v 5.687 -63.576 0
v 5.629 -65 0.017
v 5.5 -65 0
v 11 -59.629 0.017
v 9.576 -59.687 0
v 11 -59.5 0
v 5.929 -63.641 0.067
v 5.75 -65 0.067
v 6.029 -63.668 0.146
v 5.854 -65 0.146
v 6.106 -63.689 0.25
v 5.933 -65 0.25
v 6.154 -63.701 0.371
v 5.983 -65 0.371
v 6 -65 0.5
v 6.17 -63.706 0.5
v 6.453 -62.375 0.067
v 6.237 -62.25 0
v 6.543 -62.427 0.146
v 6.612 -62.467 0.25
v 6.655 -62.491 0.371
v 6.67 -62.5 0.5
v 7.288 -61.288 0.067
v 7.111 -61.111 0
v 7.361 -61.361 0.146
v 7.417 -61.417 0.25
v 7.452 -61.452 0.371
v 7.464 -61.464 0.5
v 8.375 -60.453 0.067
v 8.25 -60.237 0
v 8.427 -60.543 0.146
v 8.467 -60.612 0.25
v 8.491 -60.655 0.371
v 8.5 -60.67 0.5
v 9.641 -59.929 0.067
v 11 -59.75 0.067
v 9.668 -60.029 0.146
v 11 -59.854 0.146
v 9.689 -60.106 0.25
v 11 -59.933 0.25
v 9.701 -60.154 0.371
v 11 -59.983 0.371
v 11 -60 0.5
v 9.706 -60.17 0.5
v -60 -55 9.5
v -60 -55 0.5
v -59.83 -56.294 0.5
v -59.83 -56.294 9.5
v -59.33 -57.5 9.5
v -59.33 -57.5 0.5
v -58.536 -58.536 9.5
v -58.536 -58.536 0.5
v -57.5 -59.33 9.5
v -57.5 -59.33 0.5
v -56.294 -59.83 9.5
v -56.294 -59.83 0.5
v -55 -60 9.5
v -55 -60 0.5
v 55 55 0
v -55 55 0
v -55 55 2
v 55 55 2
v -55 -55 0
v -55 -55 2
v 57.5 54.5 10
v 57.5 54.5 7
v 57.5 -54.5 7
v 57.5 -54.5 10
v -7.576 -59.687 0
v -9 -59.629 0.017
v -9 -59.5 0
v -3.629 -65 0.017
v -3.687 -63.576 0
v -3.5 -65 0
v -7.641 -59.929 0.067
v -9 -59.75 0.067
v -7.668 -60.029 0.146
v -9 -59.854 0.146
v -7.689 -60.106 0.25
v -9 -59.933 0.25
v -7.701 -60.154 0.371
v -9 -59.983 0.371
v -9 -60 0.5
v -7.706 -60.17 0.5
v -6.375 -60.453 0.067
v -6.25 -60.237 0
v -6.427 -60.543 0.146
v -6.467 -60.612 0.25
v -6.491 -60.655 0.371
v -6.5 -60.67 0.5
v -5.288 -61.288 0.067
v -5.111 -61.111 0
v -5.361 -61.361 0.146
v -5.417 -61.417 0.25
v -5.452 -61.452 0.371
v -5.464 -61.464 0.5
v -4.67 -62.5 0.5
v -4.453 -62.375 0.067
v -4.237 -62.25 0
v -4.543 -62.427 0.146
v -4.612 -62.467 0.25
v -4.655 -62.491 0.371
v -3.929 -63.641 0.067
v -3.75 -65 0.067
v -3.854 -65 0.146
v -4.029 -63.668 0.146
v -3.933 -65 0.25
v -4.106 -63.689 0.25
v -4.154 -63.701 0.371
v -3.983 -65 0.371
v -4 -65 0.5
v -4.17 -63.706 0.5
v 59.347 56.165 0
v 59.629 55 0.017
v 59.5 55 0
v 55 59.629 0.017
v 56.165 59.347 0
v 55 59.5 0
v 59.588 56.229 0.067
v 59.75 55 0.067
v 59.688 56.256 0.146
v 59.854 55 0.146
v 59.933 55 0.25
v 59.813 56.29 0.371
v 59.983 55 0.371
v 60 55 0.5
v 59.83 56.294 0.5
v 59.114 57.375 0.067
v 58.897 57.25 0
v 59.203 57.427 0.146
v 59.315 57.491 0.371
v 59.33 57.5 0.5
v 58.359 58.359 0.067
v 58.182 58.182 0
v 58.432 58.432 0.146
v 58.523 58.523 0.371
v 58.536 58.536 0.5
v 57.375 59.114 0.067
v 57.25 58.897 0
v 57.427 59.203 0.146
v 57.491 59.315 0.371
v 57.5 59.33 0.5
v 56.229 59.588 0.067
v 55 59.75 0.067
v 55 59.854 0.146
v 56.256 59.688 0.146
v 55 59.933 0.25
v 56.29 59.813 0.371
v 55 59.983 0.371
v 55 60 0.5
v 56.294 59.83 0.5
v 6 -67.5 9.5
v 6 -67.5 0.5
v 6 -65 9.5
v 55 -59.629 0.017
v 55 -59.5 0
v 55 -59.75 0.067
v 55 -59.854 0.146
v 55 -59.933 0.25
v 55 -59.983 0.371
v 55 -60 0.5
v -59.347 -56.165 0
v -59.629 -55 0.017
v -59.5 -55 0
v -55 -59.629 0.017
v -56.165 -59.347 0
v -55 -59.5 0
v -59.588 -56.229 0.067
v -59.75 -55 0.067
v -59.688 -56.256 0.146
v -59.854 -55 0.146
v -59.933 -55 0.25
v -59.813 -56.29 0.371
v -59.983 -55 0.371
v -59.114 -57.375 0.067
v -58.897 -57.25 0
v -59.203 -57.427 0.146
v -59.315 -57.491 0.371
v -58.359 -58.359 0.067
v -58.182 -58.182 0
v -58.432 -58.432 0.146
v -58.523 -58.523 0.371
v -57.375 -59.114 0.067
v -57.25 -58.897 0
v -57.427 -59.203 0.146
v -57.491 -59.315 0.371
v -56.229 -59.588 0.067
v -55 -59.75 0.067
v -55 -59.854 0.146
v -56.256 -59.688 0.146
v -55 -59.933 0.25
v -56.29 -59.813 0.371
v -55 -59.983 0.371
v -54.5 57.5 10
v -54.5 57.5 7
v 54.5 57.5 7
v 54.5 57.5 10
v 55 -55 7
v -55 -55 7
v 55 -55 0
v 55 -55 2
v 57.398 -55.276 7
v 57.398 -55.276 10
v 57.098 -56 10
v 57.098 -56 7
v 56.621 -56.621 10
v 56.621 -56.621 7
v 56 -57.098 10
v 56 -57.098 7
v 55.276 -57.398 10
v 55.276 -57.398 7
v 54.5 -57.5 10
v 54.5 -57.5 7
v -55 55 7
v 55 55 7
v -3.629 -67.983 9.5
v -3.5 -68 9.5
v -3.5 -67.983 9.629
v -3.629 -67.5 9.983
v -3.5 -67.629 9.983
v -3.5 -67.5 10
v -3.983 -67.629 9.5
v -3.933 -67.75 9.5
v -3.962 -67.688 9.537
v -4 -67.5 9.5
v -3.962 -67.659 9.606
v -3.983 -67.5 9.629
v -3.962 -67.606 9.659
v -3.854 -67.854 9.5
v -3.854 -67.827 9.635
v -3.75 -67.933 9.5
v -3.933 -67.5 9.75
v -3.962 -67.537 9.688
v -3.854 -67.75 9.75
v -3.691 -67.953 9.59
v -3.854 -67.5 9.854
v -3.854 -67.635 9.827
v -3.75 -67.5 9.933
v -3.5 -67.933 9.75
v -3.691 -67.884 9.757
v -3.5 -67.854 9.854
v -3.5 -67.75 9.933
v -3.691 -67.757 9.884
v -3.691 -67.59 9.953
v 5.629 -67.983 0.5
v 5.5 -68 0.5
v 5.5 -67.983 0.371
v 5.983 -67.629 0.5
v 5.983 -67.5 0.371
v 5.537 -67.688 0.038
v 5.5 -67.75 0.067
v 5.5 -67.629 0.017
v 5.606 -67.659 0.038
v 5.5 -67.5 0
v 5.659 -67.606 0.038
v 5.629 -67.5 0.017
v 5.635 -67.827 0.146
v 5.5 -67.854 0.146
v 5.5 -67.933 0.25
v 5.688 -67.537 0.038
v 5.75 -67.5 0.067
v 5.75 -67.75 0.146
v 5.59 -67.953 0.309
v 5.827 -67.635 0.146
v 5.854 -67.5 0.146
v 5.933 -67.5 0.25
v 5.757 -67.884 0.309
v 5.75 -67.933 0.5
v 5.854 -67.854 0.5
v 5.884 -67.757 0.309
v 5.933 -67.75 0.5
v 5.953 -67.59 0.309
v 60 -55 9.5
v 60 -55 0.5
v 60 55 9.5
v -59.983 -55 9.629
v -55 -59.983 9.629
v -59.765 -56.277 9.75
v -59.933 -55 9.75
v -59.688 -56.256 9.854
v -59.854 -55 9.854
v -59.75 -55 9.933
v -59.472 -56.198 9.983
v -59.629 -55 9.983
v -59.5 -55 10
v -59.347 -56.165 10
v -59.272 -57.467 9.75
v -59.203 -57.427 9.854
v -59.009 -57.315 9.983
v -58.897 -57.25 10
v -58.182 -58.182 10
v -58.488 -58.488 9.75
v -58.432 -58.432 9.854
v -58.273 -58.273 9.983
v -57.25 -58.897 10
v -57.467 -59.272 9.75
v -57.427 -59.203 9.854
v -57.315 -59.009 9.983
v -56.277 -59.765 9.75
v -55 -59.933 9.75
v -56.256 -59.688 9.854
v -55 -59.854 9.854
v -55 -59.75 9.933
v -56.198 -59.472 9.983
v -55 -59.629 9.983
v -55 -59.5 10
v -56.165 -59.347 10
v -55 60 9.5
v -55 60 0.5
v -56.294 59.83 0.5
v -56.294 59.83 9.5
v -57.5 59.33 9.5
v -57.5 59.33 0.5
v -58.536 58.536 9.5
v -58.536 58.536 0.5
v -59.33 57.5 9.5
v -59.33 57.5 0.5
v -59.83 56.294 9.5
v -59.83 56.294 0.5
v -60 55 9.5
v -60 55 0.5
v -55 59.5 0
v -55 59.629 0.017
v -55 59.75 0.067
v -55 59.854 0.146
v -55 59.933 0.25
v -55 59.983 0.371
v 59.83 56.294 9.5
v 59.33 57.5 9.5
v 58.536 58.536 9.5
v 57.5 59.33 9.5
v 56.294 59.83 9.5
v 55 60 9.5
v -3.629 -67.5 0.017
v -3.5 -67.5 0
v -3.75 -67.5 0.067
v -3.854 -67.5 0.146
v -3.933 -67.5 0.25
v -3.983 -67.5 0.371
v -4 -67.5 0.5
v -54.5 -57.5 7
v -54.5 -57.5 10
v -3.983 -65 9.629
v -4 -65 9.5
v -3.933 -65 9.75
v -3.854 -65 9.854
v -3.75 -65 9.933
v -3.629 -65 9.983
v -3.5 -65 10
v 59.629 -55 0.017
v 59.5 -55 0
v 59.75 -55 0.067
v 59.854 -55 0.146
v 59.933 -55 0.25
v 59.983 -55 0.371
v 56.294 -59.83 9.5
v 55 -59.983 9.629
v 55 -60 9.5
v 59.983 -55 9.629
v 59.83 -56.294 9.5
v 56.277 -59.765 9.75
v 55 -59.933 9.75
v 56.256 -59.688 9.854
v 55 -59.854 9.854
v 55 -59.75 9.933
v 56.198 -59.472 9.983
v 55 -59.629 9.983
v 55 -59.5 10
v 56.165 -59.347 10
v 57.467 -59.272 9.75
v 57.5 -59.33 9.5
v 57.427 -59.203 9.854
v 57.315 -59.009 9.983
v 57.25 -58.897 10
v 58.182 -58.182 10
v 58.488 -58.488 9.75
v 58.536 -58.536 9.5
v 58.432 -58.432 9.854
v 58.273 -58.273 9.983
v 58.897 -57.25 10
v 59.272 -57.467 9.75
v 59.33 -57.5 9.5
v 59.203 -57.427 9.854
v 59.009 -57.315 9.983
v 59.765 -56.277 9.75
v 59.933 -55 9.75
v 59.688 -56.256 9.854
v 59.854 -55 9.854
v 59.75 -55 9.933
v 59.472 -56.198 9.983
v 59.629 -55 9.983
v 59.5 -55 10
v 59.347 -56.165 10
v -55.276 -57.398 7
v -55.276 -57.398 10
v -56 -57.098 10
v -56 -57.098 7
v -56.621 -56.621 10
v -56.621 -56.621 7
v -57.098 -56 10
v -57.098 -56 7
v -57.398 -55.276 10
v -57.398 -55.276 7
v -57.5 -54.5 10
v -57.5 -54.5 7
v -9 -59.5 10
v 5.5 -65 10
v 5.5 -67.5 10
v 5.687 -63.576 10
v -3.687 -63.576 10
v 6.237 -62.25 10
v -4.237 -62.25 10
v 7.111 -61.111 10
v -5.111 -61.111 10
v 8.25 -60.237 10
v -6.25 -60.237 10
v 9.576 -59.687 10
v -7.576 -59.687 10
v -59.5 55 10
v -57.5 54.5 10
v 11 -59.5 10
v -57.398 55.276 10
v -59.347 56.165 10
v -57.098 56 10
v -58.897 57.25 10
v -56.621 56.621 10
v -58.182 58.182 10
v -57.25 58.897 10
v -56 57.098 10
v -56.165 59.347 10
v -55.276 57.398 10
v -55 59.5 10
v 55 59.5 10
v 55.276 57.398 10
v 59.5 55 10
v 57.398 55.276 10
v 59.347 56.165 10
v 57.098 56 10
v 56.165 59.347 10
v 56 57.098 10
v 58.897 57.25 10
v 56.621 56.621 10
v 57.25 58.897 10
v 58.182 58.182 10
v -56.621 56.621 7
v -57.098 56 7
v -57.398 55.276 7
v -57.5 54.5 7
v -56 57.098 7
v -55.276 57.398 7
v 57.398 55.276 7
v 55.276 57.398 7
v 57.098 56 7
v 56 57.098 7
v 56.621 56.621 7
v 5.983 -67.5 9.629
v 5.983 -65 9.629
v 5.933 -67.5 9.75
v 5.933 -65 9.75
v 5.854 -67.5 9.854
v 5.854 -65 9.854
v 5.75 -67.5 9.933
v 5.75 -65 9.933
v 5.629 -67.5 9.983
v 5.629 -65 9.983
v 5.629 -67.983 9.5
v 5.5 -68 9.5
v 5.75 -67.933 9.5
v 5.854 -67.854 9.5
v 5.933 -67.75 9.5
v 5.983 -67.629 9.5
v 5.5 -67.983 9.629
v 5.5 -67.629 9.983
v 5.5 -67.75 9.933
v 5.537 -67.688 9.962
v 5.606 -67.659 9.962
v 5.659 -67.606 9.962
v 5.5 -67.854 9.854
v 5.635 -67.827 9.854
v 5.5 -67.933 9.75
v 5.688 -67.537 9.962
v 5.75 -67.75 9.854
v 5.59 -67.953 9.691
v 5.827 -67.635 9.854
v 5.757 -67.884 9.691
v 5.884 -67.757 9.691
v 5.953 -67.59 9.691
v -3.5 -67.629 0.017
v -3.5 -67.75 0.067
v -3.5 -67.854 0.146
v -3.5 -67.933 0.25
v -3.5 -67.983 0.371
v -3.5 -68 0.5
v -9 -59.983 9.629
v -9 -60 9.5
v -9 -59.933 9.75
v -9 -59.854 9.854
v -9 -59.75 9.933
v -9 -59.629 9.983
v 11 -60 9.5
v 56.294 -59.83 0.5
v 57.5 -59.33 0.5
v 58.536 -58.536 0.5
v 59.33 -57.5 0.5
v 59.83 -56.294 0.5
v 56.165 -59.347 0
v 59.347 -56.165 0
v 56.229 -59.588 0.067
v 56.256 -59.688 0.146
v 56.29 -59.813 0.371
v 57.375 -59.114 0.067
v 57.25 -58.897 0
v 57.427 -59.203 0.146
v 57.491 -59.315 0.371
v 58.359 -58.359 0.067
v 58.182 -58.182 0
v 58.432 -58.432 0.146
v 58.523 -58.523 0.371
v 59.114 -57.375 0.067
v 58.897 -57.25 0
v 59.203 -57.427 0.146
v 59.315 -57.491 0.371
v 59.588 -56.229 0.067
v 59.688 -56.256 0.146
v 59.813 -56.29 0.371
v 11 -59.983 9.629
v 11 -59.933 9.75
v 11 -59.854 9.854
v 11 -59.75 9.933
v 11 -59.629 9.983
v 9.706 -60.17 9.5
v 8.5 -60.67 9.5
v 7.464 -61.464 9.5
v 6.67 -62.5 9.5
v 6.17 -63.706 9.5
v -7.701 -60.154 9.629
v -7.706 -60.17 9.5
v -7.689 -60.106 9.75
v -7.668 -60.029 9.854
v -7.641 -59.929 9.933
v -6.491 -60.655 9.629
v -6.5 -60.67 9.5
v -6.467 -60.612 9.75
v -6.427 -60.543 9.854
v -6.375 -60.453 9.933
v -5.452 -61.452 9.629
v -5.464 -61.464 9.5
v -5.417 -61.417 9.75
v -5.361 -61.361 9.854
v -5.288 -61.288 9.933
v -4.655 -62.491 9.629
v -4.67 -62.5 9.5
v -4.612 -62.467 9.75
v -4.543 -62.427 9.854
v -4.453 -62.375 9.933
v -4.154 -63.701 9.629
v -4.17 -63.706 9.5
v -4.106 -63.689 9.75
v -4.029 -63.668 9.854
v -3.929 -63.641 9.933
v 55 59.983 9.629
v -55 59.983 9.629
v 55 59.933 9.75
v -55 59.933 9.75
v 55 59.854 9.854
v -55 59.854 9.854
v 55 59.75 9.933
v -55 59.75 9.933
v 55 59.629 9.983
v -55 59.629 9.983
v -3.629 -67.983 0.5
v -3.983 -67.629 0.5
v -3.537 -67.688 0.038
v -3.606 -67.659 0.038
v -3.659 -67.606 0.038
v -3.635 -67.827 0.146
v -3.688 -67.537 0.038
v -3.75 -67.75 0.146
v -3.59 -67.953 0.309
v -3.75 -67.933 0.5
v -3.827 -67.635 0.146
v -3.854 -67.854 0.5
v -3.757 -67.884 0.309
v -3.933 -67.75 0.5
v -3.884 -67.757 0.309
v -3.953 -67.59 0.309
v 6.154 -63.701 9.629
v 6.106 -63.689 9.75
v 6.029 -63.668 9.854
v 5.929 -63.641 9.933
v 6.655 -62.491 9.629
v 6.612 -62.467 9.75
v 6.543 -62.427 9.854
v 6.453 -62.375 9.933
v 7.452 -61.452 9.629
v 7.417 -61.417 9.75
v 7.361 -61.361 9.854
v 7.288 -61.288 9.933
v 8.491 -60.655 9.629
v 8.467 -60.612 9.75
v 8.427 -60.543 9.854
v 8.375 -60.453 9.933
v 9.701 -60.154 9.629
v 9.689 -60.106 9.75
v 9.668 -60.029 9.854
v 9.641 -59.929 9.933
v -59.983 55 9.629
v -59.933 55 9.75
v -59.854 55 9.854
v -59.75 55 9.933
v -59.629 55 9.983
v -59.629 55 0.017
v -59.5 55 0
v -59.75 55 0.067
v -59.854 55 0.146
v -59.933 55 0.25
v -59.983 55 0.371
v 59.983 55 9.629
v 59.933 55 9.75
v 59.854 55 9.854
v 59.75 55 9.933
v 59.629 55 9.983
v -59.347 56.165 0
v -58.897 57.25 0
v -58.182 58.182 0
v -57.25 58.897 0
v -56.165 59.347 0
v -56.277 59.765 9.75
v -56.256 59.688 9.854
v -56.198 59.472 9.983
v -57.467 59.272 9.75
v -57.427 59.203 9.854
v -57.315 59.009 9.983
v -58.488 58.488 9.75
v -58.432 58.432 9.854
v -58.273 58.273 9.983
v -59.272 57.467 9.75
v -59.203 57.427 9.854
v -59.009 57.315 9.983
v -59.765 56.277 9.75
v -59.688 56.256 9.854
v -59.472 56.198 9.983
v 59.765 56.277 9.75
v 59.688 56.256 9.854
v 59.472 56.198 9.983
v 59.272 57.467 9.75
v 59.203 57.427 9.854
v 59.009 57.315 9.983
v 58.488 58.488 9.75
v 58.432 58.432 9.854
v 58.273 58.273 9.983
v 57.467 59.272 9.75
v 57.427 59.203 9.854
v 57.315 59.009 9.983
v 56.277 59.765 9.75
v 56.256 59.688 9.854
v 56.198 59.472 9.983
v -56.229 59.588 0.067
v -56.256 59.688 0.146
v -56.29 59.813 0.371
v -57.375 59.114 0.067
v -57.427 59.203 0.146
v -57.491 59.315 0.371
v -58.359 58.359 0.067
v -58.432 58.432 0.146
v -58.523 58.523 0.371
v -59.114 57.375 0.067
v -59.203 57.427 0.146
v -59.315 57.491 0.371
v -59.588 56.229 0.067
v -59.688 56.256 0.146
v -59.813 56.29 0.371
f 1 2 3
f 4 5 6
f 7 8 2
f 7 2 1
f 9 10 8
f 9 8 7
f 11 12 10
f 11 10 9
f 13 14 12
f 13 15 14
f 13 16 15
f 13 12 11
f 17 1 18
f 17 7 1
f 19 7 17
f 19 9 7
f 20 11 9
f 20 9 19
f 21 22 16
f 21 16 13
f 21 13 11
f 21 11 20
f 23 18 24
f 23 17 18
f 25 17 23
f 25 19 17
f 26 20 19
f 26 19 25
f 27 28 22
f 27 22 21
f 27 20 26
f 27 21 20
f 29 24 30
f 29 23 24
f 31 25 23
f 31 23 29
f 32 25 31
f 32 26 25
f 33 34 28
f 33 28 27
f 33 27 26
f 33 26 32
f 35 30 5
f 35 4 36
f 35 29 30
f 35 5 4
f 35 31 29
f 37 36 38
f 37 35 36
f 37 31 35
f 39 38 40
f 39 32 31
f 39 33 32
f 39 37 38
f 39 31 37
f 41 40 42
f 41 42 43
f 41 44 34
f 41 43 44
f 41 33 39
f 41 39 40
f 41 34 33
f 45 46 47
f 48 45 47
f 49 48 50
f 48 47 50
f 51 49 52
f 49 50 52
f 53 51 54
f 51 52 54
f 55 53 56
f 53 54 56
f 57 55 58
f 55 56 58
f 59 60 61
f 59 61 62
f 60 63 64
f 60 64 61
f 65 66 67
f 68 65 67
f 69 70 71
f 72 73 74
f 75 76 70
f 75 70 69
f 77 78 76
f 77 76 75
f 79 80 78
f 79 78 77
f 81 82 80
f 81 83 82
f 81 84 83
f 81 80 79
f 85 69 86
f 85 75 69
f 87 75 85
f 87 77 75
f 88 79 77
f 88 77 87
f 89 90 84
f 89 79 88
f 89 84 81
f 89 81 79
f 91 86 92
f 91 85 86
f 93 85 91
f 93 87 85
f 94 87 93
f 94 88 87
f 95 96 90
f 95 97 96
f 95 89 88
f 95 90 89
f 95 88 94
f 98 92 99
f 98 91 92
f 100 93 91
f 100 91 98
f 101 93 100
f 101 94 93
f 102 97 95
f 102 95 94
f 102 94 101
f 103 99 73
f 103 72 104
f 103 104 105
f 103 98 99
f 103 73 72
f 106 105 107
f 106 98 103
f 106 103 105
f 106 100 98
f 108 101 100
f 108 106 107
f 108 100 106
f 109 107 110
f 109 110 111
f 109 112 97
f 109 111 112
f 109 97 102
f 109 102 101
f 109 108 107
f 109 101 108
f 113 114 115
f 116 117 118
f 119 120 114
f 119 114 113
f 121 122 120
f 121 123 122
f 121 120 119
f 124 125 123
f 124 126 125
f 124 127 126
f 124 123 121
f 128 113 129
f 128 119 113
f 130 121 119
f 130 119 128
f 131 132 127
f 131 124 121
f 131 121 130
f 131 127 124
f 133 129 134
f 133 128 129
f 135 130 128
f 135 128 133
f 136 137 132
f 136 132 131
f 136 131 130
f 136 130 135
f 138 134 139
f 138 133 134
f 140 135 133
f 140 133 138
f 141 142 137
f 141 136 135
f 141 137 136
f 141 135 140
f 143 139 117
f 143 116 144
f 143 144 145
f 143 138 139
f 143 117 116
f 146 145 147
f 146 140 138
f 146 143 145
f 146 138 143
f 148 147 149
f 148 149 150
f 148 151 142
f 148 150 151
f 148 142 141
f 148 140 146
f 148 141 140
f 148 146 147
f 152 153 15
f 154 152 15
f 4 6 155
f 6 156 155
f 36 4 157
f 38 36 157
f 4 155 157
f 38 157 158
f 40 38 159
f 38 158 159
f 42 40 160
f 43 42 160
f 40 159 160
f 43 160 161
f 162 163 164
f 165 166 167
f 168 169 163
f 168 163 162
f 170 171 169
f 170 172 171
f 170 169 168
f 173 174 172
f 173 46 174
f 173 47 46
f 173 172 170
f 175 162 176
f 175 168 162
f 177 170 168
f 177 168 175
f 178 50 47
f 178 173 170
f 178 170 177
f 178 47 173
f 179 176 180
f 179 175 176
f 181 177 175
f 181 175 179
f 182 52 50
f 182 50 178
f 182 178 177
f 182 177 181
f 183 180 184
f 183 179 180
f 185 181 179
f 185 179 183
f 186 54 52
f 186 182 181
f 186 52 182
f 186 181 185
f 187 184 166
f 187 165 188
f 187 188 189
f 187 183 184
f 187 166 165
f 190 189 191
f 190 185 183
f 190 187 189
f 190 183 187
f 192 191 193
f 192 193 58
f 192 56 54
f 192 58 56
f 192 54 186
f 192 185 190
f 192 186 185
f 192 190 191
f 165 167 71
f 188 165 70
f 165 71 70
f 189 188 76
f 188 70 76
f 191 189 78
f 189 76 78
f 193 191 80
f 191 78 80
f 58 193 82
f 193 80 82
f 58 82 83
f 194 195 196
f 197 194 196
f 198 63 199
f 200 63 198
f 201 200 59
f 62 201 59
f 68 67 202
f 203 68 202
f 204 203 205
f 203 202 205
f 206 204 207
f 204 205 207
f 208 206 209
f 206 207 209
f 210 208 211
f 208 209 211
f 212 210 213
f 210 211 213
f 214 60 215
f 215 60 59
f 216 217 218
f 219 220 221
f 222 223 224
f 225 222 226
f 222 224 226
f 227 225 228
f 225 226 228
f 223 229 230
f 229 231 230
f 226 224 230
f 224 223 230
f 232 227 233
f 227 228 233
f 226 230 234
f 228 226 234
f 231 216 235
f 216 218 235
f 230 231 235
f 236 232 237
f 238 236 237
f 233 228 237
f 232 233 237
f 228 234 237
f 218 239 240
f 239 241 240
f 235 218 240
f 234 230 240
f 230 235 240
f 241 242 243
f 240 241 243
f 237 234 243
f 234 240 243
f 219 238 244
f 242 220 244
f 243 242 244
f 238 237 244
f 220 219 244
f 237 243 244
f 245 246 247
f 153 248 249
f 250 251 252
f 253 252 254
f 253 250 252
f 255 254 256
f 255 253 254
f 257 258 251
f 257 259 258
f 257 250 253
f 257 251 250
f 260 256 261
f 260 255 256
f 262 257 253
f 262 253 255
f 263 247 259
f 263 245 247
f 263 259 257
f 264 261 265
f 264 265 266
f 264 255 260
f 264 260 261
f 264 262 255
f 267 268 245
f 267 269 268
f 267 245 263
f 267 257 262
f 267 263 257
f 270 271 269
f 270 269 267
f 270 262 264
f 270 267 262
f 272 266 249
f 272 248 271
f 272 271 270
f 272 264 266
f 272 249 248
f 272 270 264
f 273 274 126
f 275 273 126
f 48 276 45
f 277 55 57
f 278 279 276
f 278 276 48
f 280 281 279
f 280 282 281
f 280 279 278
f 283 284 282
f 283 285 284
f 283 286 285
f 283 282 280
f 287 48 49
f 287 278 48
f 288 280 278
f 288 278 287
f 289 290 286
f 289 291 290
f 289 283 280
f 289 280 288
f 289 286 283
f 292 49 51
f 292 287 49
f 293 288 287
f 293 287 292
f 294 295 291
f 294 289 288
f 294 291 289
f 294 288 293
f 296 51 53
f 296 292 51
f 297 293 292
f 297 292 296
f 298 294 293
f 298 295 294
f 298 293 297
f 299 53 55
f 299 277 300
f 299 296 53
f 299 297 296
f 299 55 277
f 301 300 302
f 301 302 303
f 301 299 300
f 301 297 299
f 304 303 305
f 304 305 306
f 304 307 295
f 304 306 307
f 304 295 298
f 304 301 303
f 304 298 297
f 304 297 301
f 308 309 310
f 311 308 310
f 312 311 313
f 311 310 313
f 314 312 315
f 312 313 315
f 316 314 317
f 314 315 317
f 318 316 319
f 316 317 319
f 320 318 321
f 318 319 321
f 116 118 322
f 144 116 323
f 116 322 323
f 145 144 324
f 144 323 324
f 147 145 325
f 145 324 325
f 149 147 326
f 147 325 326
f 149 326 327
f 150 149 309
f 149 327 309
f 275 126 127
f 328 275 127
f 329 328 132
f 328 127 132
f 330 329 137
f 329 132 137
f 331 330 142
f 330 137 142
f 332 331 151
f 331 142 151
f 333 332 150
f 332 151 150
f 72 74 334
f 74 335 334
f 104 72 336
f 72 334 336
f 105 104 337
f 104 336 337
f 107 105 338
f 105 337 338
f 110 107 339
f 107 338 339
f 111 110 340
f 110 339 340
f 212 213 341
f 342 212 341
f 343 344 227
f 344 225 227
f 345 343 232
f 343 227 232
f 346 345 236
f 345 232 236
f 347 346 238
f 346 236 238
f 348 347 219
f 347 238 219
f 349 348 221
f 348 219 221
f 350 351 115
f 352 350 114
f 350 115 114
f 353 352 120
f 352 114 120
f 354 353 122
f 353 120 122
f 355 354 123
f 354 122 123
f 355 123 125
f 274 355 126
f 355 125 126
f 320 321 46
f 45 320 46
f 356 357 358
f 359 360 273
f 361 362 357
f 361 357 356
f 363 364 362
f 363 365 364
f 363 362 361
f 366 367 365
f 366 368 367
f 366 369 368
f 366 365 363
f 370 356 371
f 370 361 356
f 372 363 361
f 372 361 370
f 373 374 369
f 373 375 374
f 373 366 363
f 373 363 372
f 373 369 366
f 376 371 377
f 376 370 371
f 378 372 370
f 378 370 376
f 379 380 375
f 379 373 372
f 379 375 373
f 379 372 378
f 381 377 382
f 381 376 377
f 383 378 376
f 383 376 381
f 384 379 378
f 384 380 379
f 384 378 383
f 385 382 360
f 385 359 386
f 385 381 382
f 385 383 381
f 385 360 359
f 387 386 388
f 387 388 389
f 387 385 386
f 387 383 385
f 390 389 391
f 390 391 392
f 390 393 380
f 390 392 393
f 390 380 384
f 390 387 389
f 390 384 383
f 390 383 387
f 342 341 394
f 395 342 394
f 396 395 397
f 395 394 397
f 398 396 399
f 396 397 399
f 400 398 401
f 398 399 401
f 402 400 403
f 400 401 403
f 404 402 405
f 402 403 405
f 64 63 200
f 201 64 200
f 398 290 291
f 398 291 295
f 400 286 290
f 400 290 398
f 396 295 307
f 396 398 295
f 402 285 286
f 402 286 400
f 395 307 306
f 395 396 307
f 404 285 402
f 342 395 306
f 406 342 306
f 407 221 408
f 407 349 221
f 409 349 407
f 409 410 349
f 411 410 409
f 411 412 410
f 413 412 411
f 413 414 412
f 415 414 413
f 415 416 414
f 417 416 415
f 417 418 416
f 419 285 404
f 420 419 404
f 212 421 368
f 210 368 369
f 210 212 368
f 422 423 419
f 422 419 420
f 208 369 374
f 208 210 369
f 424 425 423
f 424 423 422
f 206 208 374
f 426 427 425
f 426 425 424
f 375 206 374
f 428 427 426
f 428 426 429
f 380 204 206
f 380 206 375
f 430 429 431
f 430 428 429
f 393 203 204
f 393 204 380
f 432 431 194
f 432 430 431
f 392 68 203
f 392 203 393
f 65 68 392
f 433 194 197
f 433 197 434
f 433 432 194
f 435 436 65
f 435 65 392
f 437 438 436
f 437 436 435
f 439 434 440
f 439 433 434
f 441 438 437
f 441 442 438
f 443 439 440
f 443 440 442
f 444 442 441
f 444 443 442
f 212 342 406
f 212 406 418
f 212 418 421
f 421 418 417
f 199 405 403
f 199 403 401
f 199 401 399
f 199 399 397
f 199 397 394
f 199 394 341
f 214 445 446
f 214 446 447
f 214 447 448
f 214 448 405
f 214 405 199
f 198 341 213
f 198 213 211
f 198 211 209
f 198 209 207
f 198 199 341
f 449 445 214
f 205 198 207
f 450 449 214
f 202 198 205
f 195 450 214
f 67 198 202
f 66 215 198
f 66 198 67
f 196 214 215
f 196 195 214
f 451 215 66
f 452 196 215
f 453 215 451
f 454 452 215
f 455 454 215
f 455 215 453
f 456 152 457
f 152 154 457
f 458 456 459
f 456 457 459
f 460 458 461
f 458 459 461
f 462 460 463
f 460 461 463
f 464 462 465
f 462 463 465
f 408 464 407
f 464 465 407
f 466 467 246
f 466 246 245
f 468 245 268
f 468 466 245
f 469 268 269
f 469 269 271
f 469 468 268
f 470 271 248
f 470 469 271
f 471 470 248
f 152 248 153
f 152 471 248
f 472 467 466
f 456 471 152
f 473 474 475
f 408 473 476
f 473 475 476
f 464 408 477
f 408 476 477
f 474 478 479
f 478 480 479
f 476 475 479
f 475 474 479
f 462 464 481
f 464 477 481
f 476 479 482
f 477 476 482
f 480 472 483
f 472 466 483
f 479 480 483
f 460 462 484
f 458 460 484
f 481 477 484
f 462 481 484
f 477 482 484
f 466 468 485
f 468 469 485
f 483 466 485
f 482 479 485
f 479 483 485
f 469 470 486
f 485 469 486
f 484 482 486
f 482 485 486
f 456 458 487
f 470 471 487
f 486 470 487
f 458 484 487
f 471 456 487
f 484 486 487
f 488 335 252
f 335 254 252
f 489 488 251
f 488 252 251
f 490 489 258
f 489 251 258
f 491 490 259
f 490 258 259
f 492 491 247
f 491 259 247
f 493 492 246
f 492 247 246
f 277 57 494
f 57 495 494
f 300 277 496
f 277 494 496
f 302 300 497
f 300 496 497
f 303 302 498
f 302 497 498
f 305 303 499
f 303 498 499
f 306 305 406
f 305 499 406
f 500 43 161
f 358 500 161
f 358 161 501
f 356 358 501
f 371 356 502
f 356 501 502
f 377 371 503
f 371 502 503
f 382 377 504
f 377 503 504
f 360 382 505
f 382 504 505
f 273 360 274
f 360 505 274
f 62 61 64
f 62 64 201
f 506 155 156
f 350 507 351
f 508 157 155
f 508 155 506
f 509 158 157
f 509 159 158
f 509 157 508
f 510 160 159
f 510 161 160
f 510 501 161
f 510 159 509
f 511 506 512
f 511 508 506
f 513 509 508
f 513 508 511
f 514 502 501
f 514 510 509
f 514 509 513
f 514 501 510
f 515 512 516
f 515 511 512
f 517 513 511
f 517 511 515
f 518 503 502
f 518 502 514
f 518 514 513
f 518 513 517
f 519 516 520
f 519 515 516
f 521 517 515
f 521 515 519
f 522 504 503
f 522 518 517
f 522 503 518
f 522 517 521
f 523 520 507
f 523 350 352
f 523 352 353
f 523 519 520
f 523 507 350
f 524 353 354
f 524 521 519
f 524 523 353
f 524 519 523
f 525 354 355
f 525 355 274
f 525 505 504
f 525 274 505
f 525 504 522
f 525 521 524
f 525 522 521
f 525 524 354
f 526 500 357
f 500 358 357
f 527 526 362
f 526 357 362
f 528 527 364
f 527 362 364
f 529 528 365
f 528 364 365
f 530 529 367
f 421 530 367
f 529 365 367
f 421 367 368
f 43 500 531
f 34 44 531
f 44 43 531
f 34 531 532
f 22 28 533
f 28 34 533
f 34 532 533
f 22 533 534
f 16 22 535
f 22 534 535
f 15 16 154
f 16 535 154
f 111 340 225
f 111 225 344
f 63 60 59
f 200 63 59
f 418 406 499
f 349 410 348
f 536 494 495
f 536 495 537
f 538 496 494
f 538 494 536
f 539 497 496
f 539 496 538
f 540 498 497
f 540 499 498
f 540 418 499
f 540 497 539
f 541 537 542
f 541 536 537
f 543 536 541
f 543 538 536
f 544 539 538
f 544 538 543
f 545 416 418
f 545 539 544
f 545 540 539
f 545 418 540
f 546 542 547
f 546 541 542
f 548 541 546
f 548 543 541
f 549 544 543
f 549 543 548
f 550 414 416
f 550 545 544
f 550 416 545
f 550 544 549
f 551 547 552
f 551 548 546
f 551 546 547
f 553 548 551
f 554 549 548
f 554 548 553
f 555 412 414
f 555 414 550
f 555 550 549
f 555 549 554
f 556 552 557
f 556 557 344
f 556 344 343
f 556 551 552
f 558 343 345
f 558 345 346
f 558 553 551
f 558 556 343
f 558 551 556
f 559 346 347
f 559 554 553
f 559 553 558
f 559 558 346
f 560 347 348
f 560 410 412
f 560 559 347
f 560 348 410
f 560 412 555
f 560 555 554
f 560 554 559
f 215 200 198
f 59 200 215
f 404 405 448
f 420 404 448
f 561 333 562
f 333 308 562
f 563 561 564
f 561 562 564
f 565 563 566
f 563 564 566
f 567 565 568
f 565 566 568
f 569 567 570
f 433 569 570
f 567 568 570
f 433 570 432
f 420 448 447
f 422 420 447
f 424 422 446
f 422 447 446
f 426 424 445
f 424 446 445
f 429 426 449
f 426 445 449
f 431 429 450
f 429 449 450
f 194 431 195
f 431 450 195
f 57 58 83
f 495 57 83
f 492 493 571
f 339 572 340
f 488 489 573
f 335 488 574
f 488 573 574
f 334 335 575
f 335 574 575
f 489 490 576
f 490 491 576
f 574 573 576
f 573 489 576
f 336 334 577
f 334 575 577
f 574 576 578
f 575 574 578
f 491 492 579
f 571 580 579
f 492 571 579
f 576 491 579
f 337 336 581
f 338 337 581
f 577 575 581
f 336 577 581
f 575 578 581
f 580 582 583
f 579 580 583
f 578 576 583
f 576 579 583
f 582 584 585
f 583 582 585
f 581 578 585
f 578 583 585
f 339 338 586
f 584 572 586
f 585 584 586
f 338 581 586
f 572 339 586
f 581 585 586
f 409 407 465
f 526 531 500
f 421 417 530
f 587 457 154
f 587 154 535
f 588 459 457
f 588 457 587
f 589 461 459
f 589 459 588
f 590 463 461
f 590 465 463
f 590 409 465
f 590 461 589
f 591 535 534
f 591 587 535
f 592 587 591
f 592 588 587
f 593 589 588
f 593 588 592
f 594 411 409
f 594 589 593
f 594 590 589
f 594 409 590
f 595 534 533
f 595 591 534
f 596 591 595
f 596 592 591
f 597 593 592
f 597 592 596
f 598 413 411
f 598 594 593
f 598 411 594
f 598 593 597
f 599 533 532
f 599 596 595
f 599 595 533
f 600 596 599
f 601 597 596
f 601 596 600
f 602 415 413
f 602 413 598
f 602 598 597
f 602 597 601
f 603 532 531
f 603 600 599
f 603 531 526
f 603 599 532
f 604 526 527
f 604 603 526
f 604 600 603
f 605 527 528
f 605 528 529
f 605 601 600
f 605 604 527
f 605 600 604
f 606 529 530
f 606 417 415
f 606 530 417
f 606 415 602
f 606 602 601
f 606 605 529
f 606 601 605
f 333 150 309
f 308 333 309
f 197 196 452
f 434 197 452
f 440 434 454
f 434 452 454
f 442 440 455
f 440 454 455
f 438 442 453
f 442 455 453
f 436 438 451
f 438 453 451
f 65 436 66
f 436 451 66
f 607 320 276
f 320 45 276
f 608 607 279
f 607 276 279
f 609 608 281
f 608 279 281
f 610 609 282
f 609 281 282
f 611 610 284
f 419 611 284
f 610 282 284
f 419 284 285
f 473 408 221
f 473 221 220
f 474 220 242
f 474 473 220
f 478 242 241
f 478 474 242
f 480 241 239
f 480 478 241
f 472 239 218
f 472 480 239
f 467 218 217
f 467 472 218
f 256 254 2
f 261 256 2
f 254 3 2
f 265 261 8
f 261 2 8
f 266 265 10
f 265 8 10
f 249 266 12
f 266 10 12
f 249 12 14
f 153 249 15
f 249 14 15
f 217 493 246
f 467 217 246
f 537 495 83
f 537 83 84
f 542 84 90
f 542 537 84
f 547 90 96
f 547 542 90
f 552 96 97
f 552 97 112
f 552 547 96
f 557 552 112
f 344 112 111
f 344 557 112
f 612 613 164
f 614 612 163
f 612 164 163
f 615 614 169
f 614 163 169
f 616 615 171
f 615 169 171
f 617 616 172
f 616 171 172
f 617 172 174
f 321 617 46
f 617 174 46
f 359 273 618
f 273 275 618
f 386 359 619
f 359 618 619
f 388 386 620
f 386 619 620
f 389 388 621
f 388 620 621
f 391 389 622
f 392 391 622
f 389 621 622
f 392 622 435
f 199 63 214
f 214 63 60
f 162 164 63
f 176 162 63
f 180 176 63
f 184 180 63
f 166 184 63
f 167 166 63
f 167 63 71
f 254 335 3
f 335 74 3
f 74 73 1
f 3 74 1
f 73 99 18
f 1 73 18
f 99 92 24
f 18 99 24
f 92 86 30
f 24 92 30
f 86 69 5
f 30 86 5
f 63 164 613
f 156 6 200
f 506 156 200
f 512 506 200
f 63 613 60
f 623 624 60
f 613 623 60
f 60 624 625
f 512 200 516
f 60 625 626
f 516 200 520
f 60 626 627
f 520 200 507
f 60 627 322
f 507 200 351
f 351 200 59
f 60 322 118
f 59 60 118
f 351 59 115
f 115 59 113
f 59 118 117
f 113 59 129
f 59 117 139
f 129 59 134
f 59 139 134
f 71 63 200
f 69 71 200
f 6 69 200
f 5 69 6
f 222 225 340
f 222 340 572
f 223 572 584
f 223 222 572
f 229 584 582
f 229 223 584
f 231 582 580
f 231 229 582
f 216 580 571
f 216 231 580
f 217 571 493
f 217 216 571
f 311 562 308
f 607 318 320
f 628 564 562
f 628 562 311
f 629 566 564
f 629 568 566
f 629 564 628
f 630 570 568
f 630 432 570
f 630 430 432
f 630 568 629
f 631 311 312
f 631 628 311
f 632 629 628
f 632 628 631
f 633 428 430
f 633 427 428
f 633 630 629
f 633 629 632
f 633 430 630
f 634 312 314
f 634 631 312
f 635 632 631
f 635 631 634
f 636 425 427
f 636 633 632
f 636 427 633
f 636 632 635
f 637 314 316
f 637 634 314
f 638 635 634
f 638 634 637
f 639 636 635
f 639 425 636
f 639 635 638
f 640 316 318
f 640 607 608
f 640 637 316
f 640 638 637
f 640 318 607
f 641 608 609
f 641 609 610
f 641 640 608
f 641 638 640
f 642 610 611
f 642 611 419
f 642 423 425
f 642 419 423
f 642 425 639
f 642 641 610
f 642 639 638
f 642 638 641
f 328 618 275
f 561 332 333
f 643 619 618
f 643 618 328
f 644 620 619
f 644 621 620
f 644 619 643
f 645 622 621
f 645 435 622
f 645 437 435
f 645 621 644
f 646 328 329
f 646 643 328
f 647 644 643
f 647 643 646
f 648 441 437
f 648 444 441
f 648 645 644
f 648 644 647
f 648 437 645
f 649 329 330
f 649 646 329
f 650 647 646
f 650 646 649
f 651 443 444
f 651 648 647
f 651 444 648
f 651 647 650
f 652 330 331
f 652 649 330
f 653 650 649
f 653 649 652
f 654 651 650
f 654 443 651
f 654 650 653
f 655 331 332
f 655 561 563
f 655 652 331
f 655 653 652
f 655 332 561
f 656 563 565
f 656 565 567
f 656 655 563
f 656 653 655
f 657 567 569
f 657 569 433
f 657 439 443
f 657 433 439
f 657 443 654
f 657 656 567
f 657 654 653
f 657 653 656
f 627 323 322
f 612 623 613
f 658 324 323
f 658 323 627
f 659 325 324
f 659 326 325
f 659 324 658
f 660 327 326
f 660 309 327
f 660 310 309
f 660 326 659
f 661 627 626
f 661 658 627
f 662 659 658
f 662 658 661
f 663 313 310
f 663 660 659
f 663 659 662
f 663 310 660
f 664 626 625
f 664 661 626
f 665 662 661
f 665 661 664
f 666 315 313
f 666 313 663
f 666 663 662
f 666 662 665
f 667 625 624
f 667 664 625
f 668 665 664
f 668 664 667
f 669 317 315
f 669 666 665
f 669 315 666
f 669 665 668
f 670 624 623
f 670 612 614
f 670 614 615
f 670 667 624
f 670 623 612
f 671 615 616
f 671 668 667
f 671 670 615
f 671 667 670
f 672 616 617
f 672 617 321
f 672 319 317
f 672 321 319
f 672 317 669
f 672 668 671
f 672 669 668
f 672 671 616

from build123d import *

# Parameters (mm, degrees)
F0_W     = 110
F0_H     = 110
F1_DEPTH = 2
F2_DEPTH = 7
F0_W_2   = 10
F0_H_2   = 8
F3_DEPTH = 10
F4_R     = 5
F5_R     = 0.5


with BuildPart() as f1:
    # F0 (on Top) → F1 (new body)
    with BuildSketch(Plane.XY):
        Rectangle(F0_W, F0_H)
    extrude(amount=F1_DEPTH)


with BuildPart() as f2:
    # F0 (on Top) → F2 (new body)
    with BuildSketch(Plane.XY):
        with BuildLine():
            Line((-54.5, -57.5), (54.5, -57.5))
            ThreePointArc((54.5, -57.5), (56.62132, -56.62132), (57.5, -54.5))
            Line((57.5, -54.5), (57.5, 54.5))
            ThreePointArc((57.5, 54.5), (56.62132, 56.62132), (54.5, 57.5))
            Line((54.5, 57.5), (-54.5, 57.5))
            ThreePointArc((-54.5, 57.5), (-56.62132, 56.62132), (-57.5, 54.5))
            Line((-57.5, 54.5), (-57.5, -54.5))
            ThreePointArc((-57.5, -54.5), (-56.62132, -56.62132), (-54.5, -57.5))
        make_face()
        Rectangle(F0_W, F0_H, mode=Mode.SUBTRACT)
    extrude(amount=F2_DEPTH)

    # F0 (on Top) → F3 (join)
    with BuildSketch(Plane.XY):
        with BuildLine():
            Line((6, -60), (55, -60))
            ThreePointArc((55, -60), (58.535534, -58.535534), (60, -55))
            Line((60, -55), (60, 55))
            ThreePointArc((60, 55), (58.535534, 58.535534), (55, 60))
            Line((55, 60), (-55, 60))
            ThreePointArc((-55, 60), (-58.535534, 58.535534), (-60, 55))
            Line((-60, 55), (-60, -55))
            ThreePointArc((-60, -55), (-58.535534, -58.535534), (-55, -60))
            Line((-55, -60), (-4, -60))
            Line((-4, -60), (6, -60))
        make_face()
        with BuildLine():
            ThreePointArc((57.5, -54.5), (56.62132, -56.62132), (54.5, -57.5))
            Line((54.5, -57.5), (-54.5, -57.5))
            ThreePointArc((-54.5, -57.5), (-56.62132, -56.62132), (-57.5, -54.5))
            Line((-57.5, -54.5), (-57.5, 54.5))
            ThreePointArc((-57.5, 54.5), (-56.62132, 56.62132), (-54.5, 57.5))
            Line((-54.5, 57.5), (54.5, 57.5))
            ThreePointArc((54.5, 57.5), (56.62132, 56.62132), (57.5, 54.5))
            Line((57.5, 54.5), (57.5, -54.5))
        make_face(mode=Mode.SUBTRACT)
        with Locations((1, -64)):
            Rectangle(F0_W_2, F0_H_2)
    extrude(amount=F3_DEPTH)

    # F4
    f4_edges = [f2.edges().sort_by_distance(p)[0] for p in [
        (6, -60, 5),
        (-4, -60, 5),
    ]]
    fillet(f4_edges, radius=F4_R)

    # F5
    f5_edges = [f2.edges().sort_by_distance(p)[0] for p in [
        (6, -68, 5),
        (1, -68, 10),
        (-4, -68, 5),
        (1, -68, 0),
        (33, -60, 10),
        (60, 0, 0),
    ]]
    fillet(f5_edges, radius=F5_R)


solid = Compound([f1.part, f2.part])
